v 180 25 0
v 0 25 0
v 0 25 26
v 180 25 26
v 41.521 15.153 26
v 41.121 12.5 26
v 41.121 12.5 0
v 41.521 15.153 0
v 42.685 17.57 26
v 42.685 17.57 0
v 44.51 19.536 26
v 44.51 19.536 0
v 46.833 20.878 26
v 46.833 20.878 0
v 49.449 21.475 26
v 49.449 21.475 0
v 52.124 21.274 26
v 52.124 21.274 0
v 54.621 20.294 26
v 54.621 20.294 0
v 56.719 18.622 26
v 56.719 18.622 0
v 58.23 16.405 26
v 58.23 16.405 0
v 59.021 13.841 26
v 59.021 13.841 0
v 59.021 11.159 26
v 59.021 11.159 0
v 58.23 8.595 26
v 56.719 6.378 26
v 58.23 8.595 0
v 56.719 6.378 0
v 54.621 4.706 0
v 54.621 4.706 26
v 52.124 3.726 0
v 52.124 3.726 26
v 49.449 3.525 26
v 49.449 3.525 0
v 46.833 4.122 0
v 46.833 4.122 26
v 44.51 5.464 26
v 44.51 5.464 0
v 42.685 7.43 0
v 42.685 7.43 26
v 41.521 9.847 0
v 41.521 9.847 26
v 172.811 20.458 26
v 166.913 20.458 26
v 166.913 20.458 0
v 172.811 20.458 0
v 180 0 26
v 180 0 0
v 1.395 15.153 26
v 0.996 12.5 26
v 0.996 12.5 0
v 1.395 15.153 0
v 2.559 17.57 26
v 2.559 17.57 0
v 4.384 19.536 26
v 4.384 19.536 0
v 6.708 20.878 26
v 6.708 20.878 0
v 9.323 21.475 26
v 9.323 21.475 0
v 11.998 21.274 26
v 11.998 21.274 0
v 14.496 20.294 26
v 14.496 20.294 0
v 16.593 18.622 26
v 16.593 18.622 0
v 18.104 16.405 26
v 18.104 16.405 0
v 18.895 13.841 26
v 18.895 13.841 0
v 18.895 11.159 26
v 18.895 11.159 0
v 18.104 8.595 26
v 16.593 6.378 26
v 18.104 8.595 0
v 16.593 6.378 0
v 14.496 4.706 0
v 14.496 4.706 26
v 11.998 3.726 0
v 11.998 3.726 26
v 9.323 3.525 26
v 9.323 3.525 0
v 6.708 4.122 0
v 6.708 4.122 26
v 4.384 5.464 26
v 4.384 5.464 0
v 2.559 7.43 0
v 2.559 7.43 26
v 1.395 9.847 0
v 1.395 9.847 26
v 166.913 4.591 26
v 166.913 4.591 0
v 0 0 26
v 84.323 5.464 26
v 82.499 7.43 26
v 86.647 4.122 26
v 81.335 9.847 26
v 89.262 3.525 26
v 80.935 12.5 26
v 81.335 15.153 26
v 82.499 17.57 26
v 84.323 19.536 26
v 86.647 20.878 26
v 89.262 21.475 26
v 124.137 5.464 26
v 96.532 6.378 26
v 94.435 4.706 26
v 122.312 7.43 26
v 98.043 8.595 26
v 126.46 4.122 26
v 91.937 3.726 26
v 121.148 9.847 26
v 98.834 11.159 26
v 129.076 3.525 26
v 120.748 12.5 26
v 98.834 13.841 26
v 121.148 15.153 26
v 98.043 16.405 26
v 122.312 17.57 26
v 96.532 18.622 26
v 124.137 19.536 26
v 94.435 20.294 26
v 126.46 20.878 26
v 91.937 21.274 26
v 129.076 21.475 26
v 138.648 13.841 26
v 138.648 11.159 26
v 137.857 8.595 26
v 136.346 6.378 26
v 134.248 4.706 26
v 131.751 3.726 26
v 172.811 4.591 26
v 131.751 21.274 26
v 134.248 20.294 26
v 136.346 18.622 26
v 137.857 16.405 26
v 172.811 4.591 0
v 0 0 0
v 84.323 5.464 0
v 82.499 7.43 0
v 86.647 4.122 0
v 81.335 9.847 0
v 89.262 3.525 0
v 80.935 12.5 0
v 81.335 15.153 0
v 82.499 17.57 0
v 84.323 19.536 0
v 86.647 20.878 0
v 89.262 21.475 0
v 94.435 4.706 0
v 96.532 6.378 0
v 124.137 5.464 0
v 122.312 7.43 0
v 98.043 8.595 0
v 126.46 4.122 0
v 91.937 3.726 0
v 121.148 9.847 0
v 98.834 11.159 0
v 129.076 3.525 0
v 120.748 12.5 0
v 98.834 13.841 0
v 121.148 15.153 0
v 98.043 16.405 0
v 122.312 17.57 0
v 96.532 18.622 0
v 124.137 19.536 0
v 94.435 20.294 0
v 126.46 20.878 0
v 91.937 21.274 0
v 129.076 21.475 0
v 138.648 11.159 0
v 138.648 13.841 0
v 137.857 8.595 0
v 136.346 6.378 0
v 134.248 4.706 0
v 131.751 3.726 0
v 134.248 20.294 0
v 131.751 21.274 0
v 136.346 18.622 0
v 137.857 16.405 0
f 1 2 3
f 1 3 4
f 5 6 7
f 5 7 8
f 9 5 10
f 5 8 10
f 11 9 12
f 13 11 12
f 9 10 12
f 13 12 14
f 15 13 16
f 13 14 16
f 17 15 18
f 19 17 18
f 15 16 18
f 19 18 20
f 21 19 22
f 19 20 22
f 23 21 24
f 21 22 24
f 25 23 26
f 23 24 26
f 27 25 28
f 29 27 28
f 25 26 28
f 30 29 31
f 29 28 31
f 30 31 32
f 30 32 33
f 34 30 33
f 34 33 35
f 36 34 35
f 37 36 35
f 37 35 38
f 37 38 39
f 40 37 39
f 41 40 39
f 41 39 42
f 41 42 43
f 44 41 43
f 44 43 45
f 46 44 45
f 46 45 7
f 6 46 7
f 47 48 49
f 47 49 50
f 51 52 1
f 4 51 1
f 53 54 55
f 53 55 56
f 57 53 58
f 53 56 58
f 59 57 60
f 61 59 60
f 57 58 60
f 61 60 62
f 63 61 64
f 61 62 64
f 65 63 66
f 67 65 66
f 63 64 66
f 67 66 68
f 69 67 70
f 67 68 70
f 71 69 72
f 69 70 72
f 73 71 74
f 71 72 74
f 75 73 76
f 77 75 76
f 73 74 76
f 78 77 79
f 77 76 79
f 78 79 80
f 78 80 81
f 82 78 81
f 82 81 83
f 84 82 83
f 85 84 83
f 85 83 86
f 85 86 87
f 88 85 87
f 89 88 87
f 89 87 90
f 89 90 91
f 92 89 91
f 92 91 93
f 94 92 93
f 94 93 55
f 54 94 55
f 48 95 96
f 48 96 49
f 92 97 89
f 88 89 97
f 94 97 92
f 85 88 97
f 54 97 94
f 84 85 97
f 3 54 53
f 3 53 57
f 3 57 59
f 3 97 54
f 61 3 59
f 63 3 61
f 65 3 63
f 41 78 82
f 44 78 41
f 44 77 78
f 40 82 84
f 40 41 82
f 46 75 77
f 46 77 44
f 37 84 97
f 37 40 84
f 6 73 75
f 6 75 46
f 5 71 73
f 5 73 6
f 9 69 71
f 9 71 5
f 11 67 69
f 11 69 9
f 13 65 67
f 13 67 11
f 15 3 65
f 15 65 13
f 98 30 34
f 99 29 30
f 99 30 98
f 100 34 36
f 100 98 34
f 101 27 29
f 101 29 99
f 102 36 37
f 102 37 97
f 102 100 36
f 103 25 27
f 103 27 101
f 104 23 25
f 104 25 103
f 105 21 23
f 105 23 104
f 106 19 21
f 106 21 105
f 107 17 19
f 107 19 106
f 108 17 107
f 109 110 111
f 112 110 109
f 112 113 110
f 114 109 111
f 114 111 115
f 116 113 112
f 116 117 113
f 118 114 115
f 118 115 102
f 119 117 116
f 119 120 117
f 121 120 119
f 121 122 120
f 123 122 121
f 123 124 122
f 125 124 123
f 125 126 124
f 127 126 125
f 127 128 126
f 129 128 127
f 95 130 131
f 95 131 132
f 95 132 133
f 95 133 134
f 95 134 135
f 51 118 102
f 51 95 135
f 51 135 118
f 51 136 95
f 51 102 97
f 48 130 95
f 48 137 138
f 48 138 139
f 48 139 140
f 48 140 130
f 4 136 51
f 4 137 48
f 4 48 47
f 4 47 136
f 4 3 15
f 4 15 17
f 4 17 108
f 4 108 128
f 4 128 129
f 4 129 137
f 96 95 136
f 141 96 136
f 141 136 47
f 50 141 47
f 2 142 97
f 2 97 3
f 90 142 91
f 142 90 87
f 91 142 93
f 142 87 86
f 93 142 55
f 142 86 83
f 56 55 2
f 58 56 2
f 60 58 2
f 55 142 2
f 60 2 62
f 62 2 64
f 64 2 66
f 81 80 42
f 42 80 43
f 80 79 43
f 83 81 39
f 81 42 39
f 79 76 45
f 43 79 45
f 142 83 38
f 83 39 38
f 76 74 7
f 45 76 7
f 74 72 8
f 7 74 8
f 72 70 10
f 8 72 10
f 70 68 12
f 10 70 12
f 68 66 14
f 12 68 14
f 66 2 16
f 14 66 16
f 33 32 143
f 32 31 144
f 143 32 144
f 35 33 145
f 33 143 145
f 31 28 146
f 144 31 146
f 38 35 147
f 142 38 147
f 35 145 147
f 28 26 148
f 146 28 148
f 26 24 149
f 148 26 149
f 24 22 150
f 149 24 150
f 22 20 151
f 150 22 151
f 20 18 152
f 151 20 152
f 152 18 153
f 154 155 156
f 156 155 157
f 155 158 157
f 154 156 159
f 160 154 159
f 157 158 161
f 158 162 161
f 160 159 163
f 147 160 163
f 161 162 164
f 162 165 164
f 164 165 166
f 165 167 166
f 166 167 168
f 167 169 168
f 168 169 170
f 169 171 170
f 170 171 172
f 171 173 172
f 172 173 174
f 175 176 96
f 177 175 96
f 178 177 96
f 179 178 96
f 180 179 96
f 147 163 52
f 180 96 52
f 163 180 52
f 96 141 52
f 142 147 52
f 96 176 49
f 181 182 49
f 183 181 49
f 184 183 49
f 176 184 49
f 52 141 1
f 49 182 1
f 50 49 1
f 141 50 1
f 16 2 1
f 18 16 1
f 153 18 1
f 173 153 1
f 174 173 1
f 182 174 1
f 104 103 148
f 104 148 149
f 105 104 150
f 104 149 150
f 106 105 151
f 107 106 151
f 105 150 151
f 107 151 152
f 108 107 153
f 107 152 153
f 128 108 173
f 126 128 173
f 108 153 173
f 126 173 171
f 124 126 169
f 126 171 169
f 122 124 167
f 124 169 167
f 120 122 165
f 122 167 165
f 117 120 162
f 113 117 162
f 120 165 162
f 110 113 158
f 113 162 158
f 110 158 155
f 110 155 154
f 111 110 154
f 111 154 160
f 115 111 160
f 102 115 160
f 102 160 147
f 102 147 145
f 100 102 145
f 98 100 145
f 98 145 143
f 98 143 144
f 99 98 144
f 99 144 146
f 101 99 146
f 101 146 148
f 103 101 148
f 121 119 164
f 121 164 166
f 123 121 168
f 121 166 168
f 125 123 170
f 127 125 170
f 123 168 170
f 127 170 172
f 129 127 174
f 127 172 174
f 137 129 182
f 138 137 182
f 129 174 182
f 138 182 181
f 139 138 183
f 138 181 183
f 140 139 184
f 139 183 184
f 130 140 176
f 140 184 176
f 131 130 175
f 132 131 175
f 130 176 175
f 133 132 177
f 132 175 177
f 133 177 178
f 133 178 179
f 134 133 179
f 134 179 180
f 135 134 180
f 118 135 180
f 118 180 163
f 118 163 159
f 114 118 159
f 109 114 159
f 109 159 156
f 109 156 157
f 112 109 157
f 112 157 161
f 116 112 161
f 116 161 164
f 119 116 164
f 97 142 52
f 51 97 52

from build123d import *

# Parameters (mm, degrees)
SKIZZE1_W                        = 180
SKIZZE1_H                        = 25
AUFSATZ_LINEAR_AUSTRAGEN1_DEPTH  = 26
F_18_0_18_DURCHMESSER_BOHRUNG2_D = 18
SKIZZE9_W                        = 5.897581214
SKIZZE9_H                        = 15.867301838
SCHNITT_LINEAR_AUSTRAGEN1_DEPTH  = 27


with BuildPart() as part:
    # Skizze1 → Aufsatz-Linear austragen1 (new body)
    with BuildSketch(Plane.XY):
        with Locations((90, 12.5)):
            Rectangle(SKIZZE1_W, SKIZZE1_H)
    extrude(amount=AUFSATZ_LINEAR_AUSTRAGEN1_DEPTH)

    # Ø18.0 (18) Durchmesser Bohrung2 (through all)
    with Locations(Plane.XY.offset(26)):
        with Locations((9.995618269, 12.5), (50.121303026, 12.5), (89.934725645, 12.5), (129.748148264, 12.5)):
            Hole(F_18_0_18_DURCHMESSER_BOHRUNG2_D / 2)

    # Skizze9 → Schnitt-Linear austragen1 (cut, through all)
    with BuildSketch(Plane.XY.offset(26)):
        with Locations((169.861933283, 12.524643843)):
            Rectangle(SKIZZE9_W, SKIZZE9_H)
    extrude(amount=-SCHNITT_LINEAR_AUSTRAGEN1_DEPTH, mode=Mode.SUBTRACT)


solid = part.part
